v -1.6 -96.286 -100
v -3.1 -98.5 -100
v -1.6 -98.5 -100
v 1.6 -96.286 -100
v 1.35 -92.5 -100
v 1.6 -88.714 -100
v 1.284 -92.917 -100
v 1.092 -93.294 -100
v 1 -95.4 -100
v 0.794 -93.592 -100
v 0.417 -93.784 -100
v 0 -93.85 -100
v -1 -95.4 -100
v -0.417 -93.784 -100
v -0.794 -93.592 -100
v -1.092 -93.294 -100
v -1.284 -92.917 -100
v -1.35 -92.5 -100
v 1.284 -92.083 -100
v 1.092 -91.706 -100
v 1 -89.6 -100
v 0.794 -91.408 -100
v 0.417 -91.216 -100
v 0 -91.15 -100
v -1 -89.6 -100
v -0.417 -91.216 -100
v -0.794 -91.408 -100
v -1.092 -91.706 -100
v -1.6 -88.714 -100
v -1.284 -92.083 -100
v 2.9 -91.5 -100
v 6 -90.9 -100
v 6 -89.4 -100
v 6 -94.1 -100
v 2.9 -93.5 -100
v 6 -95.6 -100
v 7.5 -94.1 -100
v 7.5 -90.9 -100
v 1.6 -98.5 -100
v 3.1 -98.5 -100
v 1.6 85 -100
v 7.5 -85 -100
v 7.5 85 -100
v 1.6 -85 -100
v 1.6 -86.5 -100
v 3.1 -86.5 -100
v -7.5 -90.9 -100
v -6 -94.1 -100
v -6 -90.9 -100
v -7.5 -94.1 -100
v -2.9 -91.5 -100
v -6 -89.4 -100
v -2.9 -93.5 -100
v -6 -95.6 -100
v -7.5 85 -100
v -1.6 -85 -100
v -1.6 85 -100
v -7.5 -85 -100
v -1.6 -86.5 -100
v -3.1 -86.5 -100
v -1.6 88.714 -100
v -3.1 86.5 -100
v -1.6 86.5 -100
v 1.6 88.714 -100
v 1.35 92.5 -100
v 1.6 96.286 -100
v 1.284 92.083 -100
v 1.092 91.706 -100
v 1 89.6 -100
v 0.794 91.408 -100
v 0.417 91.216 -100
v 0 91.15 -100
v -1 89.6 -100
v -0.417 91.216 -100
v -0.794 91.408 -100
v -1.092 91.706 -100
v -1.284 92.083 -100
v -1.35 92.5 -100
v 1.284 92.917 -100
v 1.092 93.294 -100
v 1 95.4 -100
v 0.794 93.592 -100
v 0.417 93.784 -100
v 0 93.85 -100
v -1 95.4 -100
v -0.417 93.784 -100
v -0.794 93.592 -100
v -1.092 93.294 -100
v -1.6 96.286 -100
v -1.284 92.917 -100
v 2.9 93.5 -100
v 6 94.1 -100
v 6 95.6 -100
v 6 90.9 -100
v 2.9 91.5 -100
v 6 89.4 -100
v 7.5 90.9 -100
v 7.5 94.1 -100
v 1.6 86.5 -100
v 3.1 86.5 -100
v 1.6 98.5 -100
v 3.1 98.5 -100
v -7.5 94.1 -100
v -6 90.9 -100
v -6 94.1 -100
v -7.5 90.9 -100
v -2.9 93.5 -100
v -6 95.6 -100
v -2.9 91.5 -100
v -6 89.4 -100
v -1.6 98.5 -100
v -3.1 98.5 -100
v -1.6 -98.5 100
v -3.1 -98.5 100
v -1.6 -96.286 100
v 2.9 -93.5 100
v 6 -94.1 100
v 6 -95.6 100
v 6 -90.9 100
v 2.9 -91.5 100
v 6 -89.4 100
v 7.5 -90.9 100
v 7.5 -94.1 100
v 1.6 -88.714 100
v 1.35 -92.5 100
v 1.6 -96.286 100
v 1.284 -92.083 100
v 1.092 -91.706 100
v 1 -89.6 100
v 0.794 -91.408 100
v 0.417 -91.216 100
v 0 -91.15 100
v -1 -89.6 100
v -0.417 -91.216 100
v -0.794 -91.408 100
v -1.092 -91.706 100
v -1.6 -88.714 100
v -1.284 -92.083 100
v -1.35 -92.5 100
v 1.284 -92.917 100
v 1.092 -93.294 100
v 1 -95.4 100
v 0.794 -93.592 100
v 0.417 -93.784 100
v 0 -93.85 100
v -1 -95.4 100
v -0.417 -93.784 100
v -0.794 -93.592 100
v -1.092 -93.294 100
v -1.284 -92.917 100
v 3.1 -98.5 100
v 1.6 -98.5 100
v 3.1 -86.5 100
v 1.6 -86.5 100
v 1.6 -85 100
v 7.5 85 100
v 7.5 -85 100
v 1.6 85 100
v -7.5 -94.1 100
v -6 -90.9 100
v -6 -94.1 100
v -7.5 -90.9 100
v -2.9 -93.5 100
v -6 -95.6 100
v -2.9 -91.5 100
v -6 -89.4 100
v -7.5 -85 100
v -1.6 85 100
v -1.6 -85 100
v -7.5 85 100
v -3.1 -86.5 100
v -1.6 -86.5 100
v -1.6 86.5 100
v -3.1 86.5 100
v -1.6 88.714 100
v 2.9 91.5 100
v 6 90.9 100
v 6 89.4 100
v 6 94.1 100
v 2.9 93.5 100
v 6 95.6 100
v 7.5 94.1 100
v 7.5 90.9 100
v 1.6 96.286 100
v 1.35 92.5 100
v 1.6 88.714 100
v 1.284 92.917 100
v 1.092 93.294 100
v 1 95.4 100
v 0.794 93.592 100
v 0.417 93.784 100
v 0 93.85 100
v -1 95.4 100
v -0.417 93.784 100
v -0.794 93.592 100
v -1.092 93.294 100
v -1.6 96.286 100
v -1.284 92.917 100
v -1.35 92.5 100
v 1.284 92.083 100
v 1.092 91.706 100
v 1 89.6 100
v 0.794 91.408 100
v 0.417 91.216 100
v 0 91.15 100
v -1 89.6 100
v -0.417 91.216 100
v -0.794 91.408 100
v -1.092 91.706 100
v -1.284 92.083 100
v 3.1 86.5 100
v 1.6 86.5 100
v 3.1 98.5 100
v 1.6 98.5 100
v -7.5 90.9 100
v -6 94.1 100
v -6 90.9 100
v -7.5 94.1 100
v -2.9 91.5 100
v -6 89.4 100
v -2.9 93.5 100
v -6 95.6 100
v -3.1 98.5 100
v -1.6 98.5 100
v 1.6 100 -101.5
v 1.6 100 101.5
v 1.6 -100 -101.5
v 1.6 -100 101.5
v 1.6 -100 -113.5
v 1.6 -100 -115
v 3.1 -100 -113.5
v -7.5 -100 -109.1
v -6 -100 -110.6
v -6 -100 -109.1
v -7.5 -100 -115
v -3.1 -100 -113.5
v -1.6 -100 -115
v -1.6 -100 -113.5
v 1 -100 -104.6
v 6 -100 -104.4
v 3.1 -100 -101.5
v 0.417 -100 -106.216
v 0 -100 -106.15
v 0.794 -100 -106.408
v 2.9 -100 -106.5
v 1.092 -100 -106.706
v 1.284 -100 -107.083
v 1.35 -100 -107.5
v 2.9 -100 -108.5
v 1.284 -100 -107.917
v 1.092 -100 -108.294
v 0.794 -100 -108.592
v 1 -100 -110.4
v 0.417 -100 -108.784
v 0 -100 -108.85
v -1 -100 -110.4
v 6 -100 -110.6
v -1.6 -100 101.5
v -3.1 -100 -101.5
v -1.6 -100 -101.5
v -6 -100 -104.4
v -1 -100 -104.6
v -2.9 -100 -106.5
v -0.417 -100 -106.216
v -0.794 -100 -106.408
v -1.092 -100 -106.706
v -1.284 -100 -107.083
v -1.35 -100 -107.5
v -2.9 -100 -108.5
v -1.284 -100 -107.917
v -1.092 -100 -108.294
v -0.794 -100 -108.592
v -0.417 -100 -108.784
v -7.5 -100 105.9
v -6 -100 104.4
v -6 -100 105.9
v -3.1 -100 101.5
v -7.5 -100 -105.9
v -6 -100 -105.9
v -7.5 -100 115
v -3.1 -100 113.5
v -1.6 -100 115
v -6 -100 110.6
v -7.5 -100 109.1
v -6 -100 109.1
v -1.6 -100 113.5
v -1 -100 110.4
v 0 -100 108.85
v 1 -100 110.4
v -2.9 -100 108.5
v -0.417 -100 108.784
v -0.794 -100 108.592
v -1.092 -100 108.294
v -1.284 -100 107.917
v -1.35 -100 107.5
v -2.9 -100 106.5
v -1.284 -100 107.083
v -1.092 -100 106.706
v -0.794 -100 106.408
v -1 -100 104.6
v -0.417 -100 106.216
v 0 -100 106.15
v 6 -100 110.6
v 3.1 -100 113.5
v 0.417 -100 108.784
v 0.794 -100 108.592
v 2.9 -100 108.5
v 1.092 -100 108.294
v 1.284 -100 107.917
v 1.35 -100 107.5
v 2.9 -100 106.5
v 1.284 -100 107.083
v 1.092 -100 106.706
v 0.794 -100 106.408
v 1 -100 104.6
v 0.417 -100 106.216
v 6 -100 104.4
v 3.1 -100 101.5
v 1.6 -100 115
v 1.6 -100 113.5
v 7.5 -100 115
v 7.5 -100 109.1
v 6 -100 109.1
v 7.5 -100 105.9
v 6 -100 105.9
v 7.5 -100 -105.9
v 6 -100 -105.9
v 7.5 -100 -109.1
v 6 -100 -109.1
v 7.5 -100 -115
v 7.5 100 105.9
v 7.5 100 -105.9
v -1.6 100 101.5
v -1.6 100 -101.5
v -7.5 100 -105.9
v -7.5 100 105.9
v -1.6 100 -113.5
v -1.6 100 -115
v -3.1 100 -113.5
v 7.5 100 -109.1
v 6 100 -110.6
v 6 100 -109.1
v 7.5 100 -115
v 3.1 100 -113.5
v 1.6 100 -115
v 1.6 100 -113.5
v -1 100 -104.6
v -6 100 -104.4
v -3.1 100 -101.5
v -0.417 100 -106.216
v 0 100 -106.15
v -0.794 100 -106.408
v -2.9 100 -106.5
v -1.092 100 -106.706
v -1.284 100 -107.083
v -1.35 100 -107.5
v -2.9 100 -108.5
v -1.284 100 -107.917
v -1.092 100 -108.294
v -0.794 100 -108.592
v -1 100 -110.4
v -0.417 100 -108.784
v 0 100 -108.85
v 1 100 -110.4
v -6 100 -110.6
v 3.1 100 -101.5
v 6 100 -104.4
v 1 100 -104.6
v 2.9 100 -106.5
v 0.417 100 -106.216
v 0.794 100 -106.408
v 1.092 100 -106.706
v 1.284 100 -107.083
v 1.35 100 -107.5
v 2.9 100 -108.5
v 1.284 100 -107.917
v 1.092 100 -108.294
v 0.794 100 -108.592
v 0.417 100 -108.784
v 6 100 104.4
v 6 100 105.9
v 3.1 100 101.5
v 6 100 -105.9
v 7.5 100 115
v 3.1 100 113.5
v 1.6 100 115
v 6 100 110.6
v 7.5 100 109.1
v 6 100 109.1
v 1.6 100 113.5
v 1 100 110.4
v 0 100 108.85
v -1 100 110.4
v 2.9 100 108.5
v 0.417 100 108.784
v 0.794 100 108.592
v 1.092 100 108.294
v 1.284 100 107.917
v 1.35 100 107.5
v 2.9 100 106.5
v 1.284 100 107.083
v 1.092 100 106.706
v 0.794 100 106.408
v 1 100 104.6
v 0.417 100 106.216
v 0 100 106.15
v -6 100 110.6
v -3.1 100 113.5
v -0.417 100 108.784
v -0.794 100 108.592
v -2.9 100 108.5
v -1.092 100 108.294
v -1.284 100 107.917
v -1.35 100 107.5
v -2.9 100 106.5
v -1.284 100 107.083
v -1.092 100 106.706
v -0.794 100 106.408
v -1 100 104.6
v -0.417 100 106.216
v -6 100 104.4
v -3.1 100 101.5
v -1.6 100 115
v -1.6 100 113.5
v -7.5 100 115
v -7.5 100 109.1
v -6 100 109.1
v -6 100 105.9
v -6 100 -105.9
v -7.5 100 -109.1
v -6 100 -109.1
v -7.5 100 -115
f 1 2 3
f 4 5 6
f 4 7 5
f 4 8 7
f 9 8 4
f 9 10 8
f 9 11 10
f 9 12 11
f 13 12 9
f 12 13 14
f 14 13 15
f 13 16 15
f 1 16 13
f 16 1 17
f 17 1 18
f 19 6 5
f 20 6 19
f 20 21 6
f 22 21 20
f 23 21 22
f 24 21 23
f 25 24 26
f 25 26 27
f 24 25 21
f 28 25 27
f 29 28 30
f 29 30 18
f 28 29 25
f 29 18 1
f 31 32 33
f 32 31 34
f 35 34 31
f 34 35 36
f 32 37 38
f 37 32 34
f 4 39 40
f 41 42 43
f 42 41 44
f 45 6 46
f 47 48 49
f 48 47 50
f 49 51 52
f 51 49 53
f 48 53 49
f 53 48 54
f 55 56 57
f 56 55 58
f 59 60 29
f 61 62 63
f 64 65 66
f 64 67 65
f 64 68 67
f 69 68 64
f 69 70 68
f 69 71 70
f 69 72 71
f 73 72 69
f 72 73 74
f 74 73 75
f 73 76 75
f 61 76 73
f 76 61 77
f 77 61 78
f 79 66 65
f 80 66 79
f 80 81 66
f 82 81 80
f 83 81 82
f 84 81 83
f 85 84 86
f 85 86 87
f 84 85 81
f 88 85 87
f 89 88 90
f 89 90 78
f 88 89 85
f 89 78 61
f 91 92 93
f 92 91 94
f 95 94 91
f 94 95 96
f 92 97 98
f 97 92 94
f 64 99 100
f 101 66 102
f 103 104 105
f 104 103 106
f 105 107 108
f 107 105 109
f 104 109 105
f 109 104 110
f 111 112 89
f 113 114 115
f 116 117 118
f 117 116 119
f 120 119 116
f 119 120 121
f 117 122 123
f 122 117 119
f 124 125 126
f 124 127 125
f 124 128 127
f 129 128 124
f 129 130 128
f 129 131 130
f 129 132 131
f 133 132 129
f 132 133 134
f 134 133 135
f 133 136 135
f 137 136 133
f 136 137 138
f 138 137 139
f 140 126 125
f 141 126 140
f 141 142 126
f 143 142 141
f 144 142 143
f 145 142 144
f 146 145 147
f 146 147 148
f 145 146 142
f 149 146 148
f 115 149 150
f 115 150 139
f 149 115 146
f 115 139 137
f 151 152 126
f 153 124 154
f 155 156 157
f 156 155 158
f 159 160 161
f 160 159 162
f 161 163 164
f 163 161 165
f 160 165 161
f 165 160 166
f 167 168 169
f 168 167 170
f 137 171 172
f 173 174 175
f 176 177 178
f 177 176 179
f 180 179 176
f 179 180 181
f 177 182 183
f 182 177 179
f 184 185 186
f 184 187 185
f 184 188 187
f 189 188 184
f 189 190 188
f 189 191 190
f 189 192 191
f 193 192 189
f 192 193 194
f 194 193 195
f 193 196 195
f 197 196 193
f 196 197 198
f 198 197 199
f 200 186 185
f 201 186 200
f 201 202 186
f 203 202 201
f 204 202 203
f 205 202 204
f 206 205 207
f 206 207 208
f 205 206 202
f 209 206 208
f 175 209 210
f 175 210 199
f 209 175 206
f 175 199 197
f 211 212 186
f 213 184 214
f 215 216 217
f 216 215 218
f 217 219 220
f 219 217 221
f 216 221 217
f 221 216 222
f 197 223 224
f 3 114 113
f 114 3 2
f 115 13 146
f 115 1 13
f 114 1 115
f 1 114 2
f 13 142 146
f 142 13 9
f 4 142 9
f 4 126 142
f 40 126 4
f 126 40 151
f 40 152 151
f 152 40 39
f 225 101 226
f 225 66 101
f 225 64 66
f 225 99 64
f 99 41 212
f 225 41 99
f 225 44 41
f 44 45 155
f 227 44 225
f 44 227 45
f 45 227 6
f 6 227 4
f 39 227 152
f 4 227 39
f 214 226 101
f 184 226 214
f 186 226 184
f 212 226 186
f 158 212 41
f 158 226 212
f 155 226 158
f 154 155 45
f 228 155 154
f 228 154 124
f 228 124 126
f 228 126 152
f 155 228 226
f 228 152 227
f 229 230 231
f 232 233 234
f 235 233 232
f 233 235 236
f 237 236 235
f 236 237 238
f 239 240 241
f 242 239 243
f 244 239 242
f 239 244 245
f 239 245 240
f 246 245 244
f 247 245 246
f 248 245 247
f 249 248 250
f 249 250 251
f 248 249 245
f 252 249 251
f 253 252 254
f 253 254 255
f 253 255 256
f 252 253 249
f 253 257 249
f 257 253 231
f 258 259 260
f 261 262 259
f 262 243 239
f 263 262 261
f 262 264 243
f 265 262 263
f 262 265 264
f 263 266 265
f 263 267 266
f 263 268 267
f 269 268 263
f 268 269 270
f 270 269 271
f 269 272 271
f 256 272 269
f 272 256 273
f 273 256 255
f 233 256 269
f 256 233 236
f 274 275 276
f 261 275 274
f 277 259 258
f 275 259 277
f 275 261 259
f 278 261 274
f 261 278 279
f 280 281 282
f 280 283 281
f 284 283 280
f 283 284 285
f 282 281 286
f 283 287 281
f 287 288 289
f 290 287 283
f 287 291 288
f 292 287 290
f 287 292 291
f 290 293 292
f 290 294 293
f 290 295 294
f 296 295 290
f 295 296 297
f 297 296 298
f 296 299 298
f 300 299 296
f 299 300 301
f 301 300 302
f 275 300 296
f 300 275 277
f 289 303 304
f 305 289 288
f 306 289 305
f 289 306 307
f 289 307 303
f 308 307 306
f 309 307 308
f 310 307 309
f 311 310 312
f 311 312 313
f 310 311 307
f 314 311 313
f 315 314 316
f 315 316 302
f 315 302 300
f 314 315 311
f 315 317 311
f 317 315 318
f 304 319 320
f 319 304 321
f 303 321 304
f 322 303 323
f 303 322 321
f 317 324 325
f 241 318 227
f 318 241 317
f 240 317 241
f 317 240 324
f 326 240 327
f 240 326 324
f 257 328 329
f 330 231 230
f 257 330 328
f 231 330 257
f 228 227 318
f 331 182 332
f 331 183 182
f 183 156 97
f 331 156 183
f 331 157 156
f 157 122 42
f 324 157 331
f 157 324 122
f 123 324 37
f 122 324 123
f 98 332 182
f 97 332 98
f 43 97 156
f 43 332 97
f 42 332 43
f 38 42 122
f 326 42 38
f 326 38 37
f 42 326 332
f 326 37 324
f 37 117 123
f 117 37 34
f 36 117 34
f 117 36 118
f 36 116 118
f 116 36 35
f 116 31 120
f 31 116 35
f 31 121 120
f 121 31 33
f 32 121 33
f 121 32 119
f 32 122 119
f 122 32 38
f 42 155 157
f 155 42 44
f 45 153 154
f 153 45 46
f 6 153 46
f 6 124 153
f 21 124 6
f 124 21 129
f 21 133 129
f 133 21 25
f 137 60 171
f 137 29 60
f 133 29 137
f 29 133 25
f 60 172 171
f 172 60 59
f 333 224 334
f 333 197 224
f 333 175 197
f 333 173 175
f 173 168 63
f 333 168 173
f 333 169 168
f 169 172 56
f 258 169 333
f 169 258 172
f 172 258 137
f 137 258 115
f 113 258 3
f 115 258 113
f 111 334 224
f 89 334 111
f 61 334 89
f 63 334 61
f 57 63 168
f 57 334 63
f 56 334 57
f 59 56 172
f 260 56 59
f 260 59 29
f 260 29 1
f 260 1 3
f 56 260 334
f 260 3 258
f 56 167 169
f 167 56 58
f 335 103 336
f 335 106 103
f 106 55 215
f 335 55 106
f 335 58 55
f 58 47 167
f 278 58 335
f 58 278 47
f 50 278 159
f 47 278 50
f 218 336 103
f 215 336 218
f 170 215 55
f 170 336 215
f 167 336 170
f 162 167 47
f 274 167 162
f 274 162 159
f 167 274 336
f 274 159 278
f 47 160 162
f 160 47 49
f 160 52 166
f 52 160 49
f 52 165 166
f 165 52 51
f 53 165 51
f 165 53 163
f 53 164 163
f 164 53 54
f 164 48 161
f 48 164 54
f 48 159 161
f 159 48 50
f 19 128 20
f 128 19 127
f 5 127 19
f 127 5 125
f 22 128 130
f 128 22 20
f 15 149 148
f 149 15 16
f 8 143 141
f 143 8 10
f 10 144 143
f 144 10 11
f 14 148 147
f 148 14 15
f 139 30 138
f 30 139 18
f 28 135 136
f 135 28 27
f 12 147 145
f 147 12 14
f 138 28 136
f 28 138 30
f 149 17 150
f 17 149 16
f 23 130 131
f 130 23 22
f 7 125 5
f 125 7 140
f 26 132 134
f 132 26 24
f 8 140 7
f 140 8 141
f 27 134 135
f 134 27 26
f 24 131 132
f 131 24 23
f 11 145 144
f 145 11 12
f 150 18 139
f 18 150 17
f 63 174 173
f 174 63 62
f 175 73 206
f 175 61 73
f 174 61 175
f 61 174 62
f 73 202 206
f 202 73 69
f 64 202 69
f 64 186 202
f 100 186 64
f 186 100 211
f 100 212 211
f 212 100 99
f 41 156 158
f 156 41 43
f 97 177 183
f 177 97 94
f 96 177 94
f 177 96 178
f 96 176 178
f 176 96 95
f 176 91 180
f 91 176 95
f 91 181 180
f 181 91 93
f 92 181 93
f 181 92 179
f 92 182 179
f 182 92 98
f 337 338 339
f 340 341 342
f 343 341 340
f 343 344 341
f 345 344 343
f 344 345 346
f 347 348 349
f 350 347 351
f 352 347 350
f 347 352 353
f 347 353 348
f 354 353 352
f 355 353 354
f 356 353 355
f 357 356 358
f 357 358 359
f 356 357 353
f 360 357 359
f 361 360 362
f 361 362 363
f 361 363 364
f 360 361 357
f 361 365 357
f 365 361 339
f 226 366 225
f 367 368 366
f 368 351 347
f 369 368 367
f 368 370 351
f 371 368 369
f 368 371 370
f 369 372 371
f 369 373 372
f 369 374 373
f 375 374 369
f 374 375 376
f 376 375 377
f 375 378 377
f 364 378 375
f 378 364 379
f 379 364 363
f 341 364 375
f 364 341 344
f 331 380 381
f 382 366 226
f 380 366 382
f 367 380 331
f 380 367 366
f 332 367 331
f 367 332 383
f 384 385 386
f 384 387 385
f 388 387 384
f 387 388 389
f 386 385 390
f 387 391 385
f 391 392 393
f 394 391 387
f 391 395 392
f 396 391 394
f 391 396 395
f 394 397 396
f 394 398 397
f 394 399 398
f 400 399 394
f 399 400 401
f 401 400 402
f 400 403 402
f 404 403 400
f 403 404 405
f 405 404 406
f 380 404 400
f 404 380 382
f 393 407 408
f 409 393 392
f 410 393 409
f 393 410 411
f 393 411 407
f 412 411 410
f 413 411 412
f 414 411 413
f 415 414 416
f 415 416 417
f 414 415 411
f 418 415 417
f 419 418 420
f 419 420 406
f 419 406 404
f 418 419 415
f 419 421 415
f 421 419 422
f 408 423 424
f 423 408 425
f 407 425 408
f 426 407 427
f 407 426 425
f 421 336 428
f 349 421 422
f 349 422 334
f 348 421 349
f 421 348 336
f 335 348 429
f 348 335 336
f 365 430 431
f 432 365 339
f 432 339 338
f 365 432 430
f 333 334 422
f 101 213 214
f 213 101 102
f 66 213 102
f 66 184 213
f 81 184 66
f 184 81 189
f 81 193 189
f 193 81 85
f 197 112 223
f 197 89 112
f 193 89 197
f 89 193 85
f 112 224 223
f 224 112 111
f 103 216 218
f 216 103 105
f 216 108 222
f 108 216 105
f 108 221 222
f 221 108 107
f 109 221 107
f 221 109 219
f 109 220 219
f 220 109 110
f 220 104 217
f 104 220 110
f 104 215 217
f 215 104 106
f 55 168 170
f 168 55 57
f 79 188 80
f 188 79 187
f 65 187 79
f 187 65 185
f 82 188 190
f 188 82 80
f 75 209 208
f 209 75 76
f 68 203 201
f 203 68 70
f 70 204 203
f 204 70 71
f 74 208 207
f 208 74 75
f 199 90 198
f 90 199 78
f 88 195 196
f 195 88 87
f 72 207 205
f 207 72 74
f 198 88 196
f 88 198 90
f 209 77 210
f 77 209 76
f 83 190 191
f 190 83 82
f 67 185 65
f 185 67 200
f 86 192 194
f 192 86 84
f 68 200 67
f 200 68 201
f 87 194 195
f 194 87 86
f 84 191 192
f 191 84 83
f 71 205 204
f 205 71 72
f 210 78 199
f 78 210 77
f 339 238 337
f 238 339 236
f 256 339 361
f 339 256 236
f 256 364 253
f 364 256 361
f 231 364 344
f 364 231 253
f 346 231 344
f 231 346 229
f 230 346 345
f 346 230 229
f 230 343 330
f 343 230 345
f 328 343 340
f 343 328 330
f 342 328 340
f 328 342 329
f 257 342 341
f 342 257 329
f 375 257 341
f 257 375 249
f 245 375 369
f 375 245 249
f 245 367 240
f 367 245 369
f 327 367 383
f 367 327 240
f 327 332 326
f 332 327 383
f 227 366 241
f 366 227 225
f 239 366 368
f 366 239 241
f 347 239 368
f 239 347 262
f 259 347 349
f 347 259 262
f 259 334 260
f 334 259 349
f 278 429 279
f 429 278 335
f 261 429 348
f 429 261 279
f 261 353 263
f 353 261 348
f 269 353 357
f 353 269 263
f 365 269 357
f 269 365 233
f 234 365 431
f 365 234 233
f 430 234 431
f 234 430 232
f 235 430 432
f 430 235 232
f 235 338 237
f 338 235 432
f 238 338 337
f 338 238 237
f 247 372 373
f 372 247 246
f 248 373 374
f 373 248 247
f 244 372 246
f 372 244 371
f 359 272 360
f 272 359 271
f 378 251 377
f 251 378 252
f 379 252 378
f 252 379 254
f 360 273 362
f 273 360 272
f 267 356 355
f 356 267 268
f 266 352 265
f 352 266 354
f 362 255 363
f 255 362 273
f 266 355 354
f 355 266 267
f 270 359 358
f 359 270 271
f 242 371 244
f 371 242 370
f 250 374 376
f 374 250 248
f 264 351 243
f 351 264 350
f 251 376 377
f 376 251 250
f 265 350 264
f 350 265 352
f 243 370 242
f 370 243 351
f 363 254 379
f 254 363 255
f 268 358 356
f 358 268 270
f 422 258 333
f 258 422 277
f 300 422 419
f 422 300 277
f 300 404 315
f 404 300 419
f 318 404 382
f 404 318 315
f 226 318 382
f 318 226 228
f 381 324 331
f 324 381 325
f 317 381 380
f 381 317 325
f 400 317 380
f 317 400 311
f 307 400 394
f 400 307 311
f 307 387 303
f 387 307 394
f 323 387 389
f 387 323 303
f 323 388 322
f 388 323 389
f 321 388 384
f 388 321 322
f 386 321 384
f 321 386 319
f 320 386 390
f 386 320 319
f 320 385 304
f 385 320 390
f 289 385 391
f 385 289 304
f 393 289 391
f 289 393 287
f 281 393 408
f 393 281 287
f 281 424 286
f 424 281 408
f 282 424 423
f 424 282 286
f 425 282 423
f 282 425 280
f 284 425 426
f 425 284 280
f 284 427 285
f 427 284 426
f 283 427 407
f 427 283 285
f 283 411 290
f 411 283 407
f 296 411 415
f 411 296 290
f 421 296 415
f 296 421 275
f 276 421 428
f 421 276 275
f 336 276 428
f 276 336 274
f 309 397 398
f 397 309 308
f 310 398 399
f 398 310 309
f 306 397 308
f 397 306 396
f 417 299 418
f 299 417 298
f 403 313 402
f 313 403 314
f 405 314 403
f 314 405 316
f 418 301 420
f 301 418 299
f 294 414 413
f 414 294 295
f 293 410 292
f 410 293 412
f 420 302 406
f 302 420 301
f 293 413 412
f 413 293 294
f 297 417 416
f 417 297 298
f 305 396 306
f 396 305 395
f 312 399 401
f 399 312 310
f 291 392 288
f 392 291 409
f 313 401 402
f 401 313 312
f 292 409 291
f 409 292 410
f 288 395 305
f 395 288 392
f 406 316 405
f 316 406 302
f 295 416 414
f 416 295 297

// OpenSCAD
/*

*/

//makerbeam 10x10
module makerbeam(beamlength) {
   width=10;
   edge=(width-3)/2; //3.5
   thick=1;
   inedge=edge-thick; // 2.5
   depth=3;
   middle=2;
   inwidth=(width-middle)/2; //4
	translate([-width/2,-width/2,0])
	linear_extrude(height=beamlength, center=true, convexity=10, twist=0)
	polygon( points=[[0,0],[0,edge],[thick,edge],[thick,inedge],[depth,inwidth],[depth,inwidth+middle],[thick,width-inedge],[thick,width-inedge-thick],[0,width-inedge-thick],[0,width],[edge,width],[edge,width-thick],[inedge,width-thick],[inwidth,width-depth],[inwidth+middle,width-depth],[width-inedge,width-thick],[width-inedge-thick,width-thick],[width-inedge-thick,width],[width,width],[width,width-inedge-thick],[width-thick,width-inedge-thick],[width-thick,width-inedge],[width-depth,inwidth+middle],[width-depth,inwidth],[width-thick,inedge],[width-thick,edge],[width,edge],[width,0],[width-inedge-thick,0],[width-inedge-thick,thick],[width-inedge,thick],[inwidth+middle,depth],[inwidth,depth],[inedge,thick],[edge,thick],[edge,0]] );
}

//makerbeam(20);

//openbeam 15x15
module openbeam(beamlength) {
   width=15;
   edge=(width-3.2)/2; //5.8
   thick=1.5;
   inedge=edge-thick; // 2.5
   depth=4.6;
   middle=2;
   inwidth=(width-middle)/2; //4
   tap=2.7/2;
	$fn=20;
    
   difference() {
	translate([-width/2,-width/2,0])
	linear_extrude(height=beamlength, center=true, convexity=10, twist=0)
	polygon( points=[[0,0],[0,edge],[thick,edge],[thick,inedge],[depth,inwidth],[depth,inwidth+middle],[thick,width-inedge],[thick,width-inedge-thick],[0,width-inedge-thick],[0,width],[edge,width],[edge,width-thick],[inedge,width-thick],[inwidth,width-depth],[inwidth+middle,width-depth],[width-inedge,width-thick],[width-inedge-thick,width-thick],[width-inedge-thick,width],[width,width],[width,width-inedge-thick],[width-thick,width-inedge-thick],[width-thick,width-inedge],[width-depth,inwidth+middle],[width-depth,inwidth],[width-thick,inedge],[width-thick,edge],[width,edge],[width,0],[width-inedge-thick,0],[width-inedge-thick,thick],[width-inedge,thick],[inwidth+middle,depth],[inwidth,depth],[inedge,thick],[edge,thick],[edge,0]] );
	translate([0,0,-beamlength/2-1]) cylinder(r=tap, h=beamlength+2);
	}
}

translate([0,-100+15/2,0]) rotate([0,0,0]) openbeam(200);
translate([0,100-15/2,0]) rotate([0,0,0]) openbeam(200);
translate([0,0,-100-15/2]) rotate([90,0,0]) openbeam(200);
translate([0,0,100+15/2]) rotate([90,0,0]) openbeam(200);


/*
3.5=6.4
6.5=9.7
2.5=5.4
7.5=7.4
*/
